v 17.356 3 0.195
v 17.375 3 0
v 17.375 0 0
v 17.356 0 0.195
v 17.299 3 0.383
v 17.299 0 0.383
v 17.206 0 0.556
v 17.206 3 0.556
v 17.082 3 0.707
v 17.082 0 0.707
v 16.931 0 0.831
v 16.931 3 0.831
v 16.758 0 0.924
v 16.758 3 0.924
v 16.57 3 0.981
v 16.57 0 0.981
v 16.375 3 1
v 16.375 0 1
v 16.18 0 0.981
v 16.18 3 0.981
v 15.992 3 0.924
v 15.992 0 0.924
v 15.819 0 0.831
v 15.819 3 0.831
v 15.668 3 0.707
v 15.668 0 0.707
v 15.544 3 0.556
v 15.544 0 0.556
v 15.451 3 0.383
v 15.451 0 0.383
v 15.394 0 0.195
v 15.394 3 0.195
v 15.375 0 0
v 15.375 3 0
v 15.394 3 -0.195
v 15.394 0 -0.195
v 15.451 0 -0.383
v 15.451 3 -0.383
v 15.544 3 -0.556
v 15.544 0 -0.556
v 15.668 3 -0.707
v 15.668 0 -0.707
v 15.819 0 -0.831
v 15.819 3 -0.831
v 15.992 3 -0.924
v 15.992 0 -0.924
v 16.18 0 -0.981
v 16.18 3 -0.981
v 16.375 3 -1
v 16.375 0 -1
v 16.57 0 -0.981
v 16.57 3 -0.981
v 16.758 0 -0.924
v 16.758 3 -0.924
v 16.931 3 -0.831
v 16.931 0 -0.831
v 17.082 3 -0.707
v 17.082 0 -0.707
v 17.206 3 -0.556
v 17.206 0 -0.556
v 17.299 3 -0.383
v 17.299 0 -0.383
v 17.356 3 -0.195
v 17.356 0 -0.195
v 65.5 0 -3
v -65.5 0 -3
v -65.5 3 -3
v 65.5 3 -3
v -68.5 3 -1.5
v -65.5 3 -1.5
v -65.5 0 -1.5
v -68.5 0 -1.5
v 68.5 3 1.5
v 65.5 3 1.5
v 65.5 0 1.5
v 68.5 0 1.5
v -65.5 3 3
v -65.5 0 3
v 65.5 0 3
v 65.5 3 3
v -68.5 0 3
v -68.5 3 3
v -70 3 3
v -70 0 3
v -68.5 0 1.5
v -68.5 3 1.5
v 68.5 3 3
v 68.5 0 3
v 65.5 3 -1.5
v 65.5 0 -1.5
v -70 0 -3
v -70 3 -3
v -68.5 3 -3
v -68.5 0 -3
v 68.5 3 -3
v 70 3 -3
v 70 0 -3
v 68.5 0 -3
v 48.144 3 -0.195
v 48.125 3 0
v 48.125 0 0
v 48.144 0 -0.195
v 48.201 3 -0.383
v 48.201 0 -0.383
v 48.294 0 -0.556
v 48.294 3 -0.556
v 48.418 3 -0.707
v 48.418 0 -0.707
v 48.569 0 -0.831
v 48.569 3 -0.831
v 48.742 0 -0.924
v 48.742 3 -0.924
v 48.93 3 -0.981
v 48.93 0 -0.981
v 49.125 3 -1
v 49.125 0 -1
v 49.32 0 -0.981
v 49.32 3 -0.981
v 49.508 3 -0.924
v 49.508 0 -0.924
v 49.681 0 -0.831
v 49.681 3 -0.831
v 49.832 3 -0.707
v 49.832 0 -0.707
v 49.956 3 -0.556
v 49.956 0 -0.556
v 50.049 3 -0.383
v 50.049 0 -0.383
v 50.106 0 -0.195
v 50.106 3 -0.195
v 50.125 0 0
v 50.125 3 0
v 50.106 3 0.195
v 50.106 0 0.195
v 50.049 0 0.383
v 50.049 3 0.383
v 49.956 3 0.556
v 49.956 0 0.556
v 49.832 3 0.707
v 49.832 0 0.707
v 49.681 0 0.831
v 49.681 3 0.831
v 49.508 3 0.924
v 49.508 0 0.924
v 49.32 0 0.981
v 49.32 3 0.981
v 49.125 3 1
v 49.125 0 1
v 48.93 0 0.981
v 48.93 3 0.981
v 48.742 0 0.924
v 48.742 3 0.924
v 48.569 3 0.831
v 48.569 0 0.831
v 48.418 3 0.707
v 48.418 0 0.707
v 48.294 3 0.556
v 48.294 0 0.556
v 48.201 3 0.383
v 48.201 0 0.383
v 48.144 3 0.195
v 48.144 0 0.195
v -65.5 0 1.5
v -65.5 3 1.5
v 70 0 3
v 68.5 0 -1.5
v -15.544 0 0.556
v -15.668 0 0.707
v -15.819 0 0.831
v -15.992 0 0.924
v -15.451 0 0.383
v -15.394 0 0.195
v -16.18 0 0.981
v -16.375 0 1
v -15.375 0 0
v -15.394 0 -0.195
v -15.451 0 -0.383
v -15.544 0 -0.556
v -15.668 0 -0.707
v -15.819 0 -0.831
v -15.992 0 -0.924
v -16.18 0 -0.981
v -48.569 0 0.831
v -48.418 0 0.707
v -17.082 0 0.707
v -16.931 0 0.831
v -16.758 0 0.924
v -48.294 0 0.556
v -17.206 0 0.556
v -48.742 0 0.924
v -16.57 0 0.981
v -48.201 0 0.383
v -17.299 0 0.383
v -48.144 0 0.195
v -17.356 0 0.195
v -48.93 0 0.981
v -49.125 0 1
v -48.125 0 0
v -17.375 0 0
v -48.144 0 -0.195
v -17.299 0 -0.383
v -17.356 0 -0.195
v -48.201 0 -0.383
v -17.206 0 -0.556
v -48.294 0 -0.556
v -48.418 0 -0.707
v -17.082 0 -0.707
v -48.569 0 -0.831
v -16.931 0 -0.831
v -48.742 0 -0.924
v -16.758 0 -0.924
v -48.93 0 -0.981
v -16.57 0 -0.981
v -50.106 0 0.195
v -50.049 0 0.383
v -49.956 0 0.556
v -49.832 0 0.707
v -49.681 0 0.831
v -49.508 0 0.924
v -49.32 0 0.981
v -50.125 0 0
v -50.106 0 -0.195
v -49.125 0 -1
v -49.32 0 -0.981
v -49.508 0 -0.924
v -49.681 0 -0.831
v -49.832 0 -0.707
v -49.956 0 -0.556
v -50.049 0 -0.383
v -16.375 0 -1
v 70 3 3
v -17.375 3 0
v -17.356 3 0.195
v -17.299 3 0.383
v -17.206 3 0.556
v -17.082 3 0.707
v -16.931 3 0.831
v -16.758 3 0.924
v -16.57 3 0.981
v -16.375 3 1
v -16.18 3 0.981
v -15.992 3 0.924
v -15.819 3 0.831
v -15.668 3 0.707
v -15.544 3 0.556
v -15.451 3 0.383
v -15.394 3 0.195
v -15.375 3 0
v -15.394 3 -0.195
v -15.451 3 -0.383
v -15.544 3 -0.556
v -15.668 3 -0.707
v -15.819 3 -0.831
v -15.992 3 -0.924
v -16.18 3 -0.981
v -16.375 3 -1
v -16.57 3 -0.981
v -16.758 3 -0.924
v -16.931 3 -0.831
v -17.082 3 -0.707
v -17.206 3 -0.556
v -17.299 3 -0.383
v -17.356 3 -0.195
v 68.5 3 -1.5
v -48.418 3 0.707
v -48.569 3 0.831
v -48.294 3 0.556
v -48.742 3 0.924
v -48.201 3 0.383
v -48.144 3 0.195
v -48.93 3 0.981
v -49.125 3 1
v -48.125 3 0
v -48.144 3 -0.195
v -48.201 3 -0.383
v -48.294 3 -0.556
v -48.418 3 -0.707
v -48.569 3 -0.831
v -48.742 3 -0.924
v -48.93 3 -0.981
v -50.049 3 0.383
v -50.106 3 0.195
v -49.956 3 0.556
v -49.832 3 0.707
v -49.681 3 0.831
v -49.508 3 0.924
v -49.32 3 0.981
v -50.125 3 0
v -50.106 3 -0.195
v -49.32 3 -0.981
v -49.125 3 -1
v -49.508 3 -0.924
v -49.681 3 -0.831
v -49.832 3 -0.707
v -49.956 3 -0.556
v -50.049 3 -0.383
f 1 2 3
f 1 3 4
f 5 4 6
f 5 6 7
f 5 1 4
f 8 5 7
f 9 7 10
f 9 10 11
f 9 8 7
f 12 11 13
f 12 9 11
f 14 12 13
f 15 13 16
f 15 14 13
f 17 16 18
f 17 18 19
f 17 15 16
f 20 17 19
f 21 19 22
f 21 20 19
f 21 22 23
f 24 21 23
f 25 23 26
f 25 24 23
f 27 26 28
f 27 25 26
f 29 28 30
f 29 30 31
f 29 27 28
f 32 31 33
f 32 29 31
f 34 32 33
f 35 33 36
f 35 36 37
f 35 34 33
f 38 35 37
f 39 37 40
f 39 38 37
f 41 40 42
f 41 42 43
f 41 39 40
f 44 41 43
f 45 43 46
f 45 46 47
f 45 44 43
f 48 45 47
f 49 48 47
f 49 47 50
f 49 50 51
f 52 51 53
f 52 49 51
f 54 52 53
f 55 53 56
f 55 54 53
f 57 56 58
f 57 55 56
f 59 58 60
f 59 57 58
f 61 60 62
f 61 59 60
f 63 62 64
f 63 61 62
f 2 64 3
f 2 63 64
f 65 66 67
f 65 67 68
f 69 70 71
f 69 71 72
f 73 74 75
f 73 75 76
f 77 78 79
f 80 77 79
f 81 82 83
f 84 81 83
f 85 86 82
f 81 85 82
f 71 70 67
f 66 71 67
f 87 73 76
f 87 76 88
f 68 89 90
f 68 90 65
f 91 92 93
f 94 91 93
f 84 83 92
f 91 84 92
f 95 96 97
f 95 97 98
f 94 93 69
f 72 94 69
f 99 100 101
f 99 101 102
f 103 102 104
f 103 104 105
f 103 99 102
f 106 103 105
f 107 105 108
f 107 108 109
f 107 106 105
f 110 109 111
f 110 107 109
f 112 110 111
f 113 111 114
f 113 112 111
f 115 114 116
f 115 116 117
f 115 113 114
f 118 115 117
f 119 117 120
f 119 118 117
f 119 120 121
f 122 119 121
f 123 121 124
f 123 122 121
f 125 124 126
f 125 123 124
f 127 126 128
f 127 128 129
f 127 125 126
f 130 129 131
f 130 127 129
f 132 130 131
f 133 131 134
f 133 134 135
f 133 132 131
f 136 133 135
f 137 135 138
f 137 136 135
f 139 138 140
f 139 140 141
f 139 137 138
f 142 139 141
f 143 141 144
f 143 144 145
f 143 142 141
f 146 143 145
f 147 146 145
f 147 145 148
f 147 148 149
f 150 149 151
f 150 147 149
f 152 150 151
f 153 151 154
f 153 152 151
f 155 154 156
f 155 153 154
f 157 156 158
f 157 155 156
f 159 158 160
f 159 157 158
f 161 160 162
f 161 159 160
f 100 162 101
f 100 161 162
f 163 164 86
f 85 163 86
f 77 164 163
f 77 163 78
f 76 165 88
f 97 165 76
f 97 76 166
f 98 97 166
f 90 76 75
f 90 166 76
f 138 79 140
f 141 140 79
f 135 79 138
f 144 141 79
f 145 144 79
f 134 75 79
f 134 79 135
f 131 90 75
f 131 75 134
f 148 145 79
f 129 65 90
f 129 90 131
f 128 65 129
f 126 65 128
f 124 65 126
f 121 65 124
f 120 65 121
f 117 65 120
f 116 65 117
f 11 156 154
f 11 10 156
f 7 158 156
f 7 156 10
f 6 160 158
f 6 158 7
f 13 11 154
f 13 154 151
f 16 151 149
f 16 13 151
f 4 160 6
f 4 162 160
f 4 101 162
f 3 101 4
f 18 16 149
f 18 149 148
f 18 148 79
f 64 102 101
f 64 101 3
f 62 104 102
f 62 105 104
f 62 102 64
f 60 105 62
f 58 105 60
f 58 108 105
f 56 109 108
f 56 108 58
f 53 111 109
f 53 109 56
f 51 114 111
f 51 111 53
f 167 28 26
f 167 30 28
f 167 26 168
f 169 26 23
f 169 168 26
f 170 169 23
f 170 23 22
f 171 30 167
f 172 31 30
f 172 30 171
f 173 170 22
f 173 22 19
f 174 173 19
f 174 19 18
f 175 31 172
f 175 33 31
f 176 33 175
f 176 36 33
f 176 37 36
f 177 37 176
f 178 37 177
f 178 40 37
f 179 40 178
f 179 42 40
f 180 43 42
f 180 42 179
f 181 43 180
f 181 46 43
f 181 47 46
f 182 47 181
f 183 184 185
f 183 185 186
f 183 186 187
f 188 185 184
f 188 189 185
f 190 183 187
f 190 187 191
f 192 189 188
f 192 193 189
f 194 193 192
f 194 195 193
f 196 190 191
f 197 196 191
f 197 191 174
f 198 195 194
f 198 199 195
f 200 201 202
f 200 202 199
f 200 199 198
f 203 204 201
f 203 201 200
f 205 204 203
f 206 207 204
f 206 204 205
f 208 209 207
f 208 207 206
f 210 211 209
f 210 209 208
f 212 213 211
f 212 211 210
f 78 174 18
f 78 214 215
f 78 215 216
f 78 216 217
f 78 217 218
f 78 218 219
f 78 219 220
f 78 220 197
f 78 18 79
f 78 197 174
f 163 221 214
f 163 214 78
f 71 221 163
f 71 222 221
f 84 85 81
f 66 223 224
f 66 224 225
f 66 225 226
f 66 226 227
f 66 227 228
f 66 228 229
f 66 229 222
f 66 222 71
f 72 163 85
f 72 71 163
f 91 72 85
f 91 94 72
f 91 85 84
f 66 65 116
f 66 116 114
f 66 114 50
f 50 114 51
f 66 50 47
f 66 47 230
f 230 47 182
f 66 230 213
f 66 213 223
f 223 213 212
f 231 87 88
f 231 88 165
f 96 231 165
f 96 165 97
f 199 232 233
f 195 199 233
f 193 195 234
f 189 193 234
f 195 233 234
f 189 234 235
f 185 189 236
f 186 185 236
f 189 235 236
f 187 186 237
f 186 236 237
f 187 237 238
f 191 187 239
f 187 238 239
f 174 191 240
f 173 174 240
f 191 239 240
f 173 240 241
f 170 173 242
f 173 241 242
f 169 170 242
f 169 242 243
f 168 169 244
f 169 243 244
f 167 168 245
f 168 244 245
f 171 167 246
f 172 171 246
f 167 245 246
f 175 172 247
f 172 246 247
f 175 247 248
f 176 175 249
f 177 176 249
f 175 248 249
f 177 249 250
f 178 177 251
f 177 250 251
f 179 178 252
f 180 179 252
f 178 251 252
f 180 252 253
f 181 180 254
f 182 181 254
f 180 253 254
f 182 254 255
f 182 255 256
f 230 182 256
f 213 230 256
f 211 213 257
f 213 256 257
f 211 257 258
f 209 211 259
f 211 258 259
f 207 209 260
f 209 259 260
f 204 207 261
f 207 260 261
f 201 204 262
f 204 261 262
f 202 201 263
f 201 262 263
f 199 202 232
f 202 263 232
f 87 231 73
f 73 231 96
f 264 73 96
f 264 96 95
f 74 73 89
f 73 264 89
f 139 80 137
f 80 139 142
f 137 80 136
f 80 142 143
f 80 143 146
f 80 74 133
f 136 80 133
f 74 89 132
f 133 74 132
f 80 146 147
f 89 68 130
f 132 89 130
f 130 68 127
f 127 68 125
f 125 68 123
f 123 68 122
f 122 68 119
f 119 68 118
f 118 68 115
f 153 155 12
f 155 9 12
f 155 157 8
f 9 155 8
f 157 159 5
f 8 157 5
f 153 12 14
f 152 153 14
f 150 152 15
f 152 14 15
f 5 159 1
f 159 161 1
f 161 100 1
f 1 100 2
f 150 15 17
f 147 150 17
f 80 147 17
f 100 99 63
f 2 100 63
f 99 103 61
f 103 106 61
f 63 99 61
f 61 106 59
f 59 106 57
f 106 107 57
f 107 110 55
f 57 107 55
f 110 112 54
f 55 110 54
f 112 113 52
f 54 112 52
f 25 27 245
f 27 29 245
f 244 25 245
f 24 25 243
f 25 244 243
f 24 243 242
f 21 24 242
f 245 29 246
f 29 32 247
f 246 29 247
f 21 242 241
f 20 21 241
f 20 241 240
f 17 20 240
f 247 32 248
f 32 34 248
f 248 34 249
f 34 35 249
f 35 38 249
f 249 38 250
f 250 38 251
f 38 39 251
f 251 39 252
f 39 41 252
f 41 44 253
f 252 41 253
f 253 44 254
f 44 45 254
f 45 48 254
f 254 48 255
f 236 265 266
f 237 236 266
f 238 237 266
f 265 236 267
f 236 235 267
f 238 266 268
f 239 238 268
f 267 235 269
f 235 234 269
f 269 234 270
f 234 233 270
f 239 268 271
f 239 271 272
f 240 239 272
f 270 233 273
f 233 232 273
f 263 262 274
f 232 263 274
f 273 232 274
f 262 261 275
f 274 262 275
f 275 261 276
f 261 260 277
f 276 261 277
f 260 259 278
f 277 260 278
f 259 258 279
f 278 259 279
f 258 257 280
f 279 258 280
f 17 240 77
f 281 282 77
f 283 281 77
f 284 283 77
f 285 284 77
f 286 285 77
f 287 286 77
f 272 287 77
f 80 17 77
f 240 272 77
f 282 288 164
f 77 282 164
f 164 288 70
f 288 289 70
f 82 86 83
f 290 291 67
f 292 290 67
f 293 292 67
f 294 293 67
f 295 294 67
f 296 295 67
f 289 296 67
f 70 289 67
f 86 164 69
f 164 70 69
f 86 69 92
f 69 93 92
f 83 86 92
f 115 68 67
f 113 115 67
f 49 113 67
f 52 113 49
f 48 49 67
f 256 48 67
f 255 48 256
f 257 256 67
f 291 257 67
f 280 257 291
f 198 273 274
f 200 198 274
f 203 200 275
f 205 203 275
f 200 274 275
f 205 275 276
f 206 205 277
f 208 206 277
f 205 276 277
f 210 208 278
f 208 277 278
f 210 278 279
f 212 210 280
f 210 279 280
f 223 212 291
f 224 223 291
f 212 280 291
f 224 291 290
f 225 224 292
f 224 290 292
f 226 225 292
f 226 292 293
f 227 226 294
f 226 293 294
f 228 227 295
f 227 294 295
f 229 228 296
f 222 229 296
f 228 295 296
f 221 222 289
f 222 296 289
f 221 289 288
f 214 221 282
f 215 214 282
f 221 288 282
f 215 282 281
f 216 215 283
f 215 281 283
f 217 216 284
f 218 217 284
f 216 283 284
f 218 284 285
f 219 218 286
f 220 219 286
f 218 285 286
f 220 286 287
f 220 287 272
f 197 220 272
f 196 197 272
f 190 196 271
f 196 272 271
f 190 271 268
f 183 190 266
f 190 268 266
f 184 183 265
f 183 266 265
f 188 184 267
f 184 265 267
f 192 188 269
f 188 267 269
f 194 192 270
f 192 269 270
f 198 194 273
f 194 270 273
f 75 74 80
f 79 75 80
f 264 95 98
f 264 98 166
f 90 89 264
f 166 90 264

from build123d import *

# Parameters (mm, degrees)
SKETCH1_W               = 137
SKETCH1_H               = 6
BOSS_EXTRUDE1_DEPTH     = 3
SKETCH2_W               = 3
SKETCH2_H               = 1.5
CUT_EXTRUDE1_DEPTH      = 3
MIRROR2_COPY_1_SKETCH_W = 3
MIRROR2_COPY_1_SKETCH_H = 1.5
MIRROR2_COPY_1_DEPTH    = 3
BOSS_EXTRUDE2_DEPTH     = 3
CUT_EXTRUDE2_DEPTH      = 3


with BuildPart() as part:
    # Sketch1 → Boss-Extrude1 (new body)
    with BuildSketch(Plane(origin=(0, 0, 0), x_dir=(1, 0, 0), z_dir=(0, 1, 0))):
        Rectangle(SKETCH1_W, SKETCH1_H)
    extrude(amount=BOSS_EXTRUDE1_DEPTH)

    # Sketch2 → Cut-Extrude1 (cut)
    with BuildSketch(Plane(origin=(0, 3, 0), x_dir=(1, 0, 0), z_dir=(0, 1, 0))):
        with Locations((67, 2.25)):
            Rectangle(SKETCH2_W, SKETCH2_H)
    cut_extrude1 = extrude(amount=-CUT_EXTRUDE1_DEPTH, mode=Mode.SUBTRACT)

    # Mirror1: Cut-Extrude1 across plane
    add(cut_extrude1.mirror(Plane.XY), mode=Mode.SUBTRACT)

    # Mirror2: Cut-Extrude1 across plane
    add(cut_extrude1.mirror(Plane(origin=(0, 0, 0), x_dir=(0, 0, 1), z_dir=(1, 0, 0))), mode=Mode.SUBTRACT)

    # Mirror2 copy 1 sketch → Mirror2 copy 1 (cut)
    with BuildSketch(Plane(origin=(0, 3, 0), x_dir=(-1, 0, 0), z_dir=(0, 1, 0))):
        with Locations((67, 2.25)):
            Rectangle(MIRROR2_COPY_1_SKETCH_W, MIRROR2_COPY_1_SKETCH_H)
    extrude(amount=-MIRROR2_COPY_1_DEPTH, mode=Mode.SUBTRACT)

    # Sketch3 → Boss-Extrude2 (add)
    with BuildSketch(Plane(origin=(0, 3, 0), x_dir=(1, 0, 0), z_dir=(0, 1, 0))):
        Polygon((70, 3), (68.5, 3), (68.5, 1.5), (68.5, -1.5), (68.5, -3), (70, -3), align=None)
    boss_extrude2 = extrude(amount=-BOSS_EXTRUDE2_DEPTH)

    # Mirror3: Boss-Extrude2 across plane
    add(boss_extrude2.mirror(Plane(origin=(0, 0, 0), x_dir=(0, 0, 1), z_dir=(1, 0, 0))))

    # Sketch4 → Cut-Extrude2 (cut)
    with BuildSketch(Plane(origin=(0, 3, 0), x_dir=(1, 0, 0), z_dir=(0, 1, 0))):
        with BuildLine():
            ThreePointArc((-50.125, 0), (-49.125, -1), (-48.125, 0))
            Line((-48.125, 0), (-50.125, 0))
        make_face()
        with BuildLine():
            Line((-50.125, 0), (-48.125, 0))
            ThreePointArc((-48.125, 0), (-49.125, 1), (-50.125, 0))
        make_face()
        with BuildLine():
            ThreePointArc((-15.375, 0), (-16.375, 1), (-17.375, 0))
            Line((-17.375, 0), (-15.375, 0))
        make_face()
        with BuildLine():
            Line((-15.375, 0), (-17.375, 0))
            ThreePointArc((-17.375, 0), (-16.375, -1), (-15.375, 0))
        make_face()
    cut_extrude2 = extrude(amount=-CUT_EXTRUDE2_DEPTH, mode=Mode.SUBTRACT)

    # Mirror4: Cut-Extrude2 across plane
    add(cut_extrude2.mirror(Plane(origin=(0, 0, 0), x_dir=(0, 0, 1), z_dir=(1, 0, 0))), mode=Mode.SUBTRACT)


solid = part.part
